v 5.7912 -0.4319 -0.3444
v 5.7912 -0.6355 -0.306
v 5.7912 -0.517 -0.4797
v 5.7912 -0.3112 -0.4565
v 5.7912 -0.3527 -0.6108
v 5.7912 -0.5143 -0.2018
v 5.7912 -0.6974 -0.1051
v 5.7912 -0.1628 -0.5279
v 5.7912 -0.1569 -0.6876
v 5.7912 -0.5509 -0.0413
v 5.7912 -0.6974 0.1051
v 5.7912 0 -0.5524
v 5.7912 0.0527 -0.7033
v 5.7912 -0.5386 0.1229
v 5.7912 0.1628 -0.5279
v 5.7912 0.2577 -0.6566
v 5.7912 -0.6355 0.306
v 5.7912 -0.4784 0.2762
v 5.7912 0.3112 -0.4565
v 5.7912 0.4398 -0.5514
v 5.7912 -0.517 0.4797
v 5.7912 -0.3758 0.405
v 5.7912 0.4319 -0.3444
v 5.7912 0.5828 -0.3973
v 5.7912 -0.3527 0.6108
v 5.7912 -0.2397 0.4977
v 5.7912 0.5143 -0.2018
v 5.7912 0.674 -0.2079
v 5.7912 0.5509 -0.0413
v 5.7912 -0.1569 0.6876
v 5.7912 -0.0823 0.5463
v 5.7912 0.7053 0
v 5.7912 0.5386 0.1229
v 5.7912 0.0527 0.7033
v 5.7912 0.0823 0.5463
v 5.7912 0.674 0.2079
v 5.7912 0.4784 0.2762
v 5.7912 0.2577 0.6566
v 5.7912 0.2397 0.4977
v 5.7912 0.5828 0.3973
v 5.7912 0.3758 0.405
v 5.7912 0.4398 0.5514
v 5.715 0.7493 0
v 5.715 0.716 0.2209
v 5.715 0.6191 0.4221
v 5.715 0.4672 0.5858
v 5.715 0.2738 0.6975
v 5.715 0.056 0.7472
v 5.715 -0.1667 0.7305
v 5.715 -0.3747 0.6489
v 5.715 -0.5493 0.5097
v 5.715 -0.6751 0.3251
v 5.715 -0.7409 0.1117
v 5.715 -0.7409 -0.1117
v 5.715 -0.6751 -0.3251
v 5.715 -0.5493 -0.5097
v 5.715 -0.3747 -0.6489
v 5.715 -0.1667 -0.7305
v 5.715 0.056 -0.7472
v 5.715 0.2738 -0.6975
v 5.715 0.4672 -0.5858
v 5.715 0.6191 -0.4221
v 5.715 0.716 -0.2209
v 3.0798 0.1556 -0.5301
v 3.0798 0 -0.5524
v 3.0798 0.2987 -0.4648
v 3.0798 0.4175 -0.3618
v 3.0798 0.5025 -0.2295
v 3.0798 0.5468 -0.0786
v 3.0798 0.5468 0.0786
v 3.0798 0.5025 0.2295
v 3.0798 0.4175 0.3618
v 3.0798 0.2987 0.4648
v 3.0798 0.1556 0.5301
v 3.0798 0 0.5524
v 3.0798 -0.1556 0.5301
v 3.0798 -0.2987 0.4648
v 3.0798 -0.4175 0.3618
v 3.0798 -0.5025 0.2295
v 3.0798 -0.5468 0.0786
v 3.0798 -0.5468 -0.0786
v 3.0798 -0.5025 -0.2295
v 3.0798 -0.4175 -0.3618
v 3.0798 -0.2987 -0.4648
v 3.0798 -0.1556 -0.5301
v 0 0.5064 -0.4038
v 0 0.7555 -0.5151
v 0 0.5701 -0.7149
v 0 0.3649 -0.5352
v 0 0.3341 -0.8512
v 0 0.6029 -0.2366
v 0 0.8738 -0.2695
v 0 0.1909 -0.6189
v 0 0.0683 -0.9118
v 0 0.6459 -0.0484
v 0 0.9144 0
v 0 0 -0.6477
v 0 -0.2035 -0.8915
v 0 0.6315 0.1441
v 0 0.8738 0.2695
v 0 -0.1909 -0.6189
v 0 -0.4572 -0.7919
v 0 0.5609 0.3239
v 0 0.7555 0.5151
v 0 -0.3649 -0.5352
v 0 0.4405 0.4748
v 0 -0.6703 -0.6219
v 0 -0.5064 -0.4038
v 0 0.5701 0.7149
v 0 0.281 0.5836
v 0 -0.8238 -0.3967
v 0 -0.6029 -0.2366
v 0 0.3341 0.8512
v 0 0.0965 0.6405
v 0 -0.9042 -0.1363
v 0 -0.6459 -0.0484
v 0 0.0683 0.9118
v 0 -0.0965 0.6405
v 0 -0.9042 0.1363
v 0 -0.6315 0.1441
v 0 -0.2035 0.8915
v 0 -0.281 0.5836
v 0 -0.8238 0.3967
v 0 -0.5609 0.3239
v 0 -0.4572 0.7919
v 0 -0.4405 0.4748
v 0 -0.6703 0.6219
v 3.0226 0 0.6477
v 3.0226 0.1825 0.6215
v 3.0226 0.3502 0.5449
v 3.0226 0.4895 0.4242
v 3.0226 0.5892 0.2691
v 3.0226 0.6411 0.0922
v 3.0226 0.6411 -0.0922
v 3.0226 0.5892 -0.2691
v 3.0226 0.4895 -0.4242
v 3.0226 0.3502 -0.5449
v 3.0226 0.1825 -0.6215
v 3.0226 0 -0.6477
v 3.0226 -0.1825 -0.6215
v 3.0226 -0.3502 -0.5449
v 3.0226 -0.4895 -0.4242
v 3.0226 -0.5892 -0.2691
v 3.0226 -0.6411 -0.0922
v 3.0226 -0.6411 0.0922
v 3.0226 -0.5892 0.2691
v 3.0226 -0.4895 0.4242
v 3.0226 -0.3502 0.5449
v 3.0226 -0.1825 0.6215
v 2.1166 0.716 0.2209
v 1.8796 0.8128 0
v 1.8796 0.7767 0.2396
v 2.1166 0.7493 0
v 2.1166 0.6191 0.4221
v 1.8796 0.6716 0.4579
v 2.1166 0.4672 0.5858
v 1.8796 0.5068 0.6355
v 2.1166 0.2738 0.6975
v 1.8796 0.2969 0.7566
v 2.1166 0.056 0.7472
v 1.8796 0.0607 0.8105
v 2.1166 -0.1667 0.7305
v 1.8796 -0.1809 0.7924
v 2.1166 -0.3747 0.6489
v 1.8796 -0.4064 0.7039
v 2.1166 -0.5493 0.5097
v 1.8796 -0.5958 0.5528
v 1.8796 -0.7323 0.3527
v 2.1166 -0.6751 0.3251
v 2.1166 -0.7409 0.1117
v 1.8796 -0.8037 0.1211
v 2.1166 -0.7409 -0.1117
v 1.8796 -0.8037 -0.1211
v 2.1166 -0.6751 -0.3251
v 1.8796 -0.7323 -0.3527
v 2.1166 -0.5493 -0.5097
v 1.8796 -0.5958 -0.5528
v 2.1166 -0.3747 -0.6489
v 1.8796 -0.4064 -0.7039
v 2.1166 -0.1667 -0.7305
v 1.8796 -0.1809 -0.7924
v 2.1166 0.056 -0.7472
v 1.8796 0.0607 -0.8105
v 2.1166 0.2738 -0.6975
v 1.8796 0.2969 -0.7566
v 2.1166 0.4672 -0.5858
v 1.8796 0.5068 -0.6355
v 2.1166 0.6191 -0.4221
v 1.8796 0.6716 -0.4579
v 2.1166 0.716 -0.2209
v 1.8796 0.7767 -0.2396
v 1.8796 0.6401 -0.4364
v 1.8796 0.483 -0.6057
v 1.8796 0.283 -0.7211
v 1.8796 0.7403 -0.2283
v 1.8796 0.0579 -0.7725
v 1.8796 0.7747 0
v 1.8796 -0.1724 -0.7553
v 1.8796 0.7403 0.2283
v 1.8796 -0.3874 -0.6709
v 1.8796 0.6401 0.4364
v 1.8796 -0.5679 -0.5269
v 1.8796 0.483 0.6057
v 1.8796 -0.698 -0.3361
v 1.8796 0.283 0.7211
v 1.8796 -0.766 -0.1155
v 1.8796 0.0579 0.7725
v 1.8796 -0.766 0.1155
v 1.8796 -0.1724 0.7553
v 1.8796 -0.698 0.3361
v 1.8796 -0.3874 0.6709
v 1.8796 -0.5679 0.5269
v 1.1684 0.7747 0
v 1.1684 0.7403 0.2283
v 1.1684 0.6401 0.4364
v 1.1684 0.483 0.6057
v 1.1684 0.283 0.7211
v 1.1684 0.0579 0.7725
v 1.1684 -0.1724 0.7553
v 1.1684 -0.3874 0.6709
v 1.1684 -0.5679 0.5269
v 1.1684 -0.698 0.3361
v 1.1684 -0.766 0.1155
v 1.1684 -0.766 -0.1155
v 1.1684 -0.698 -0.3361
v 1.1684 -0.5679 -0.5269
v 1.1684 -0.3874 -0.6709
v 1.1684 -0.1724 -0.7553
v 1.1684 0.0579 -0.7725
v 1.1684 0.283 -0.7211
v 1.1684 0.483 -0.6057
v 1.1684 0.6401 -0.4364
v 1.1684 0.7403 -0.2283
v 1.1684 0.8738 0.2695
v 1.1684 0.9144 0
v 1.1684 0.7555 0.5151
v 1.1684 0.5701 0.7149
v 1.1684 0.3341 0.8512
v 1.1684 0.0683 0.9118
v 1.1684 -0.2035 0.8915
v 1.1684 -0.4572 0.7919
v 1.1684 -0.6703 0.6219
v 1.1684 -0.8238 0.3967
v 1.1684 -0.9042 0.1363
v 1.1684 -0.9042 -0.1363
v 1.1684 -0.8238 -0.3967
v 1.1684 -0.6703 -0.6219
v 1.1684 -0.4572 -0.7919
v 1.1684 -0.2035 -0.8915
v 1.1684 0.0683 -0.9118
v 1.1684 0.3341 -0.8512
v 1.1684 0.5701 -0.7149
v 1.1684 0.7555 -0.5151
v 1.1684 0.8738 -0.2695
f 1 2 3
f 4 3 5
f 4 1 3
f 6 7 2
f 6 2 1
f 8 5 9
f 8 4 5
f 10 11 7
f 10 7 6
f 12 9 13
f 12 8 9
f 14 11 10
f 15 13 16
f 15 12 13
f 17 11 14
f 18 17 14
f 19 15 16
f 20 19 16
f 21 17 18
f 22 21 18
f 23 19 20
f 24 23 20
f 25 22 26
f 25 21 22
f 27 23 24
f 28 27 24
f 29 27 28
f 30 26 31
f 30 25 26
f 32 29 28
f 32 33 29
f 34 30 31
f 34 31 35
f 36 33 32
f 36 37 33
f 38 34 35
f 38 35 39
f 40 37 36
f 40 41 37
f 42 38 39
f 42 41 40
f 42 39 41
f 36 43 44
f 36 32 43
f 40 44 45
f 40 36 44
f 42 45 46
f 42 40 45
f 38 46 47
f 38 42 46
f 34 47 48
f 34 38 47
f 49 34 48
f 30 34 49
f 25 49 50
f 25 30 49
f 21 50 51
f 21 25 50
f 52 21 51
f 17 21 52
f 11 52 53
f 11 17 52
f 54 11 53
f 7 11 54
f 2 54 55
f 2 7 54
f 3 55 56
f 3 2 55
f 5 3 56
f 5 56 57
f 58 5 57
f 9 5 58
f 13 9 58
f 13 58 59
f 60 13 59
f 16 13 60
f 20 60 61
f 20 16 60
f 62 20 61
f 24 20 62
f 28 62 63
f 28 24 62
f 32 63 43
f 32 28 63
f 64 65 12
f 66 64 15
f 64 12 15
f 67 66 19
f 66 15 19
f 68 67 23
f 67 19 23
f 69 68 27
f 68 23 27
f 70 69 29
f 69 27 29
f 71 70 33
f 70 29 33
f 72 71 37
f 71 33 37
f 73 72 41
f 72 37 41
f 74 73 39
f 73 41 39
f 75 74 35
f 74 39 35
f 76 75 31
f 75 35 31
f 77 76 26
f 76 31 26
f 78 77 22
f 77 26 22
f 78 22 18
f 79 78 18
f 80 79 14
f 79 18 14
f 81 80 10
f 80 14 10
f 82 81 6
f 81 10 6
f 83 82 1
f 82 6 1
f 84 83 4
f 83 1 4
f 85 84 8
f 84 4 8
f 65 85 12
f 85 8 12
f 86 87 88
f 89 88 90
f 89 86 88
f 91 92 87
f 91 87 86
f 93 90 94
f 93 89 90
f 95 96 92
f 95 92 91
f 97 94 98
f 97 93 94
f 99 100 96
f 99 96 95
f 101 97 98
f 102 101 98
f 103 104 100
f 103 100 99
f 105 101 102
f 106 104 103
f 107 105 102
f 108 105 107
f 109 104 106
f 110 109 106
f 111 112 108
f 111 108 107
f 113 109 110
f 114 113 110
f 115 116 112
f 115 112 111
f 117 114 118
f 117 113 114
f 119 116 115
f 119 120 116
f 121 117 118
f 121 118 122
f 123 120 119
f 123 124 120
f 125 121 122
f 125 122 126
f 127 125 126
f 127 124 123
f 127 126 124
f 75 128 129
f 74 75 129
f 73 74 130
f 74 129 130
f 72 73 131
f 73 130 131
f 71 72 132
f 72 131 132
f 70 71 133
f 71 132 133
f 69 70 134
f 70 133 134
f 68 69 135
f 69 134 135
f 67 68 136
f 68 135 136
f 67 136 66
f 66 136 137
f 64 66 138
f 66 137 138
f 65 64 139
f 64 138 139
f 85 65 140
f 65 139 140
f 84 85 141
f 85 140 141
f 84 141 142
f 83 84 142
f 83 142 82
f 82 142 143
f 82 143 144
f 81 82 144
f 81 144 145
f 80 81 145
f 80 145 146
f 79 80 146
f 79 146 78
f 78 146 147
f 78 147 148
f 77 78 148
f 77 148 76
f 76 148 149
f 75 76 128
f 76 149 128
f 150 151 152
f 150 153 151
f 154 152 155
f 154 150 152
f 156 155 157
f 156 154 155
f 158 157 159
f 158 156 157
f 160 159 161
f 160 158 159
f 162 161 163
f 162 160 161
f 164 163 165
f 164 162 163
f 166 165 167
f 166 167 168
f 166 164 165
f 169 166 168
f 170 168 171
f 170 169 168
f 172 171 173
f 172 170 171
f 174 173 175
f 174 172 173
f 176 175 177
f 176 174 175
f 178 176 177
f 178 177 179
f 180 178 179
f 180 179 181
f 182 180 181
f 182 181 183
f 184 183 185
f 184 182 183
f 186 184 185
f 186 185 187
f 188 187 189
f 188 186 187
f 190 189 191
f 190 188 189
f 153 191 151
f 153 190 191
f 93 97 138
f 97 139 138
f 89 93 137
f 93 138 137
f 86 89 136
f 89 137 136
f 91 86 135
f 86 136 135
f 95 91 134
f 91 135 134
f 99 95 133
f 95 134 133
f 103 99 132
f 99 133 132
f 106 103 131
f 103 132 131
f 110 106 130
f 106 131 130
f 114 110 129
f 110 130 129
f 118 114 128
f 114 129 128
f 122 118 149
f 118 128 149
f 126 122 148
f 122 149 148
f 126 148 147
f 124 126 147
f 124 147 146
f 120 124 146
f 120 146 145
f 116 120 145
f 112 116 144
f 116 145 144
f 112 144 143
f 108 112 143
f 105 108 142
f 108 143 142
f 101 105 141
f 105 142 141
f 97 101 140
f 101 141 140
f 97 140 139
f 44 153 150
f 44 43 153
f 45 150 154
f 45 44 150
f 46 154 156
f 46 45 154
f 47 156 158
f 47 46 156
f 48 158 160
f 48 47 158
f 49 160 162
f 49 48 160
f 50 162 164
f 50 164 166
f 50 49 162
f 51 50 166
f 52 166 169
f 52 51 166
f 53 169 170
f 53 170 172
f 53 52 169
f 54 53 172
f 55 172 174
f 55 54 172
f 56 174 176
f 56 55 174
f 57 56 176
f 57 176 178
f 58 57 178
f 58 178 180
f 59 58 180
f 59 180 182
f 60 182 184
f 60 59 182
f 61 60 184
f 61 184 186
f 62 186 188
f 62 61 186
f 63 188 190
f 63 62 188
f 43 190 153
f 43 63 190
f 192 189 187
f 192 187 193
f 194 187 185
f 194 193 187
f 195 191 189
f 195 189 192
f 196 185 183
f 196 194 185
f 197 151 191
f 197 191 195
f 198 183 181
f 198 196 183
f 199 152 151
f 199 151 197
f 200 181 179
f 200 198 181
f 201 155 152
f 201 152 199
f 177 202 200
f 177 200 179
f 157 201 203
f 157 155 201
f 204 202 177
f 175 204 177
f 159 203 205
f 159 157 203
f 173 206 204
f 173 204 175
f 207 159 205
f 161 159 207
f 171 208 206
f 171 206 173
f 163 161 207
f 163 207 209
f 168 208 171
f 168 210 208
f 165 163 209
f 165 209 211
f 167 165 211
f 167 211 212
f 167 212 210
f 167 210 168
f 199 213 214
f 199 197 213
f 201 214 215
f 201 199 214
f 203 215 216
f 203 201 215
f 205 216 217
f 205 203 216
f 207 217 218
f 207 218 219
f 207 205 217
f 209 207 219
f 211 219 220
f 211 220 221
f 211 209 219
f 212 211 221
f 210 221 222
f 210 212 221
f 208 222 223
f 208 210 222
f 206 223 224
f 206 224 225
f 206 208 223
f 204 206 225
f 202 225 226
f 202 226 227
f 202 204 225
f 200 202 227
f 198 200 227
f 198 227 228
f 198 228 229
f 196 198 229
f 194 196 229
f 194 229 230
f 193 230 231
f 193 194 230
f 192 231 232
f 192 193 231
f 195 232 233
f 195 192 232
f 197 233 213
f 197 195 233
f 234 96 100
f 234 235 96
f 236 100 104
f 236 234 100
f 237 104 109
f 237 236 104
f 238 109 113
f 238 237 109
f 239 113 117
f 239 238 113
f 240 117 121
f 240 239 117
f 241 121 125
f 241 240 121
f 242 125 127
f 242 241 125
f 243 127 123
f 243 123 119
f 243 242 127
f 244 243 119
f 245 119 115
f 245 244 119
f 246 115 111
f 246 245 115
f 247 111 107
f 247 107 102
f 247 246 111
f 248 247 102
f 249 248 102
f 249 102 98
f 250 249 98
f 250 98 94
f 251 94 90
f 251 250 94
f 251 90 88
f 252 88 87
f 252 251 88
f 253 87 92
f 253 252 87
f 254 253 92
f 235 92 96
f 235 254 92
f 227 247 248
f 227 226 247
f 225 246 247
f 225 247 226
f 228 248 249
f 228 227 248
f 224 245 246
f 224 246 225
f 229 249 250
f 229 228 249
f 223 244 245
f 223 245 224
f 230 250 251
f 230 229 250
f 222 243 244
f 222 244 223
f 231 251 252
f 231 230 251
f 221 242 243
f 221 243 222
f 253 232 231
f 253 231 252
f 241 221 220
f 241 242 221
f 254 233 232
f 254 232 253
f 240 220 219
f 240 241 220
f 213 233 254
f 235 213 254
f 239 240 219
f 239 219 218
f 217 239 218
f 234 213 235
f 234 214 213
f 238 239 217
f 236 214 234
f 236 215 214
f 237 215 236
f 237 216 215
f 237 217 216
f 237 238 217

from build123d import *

# Parameters (mm, degrees)
HOLE1_D     = 1.2954
HOLE1_DEPTH = 3.0226
HOLE1_TIP   = 0.389177423
HOLE2_D     = 1.1049
HOLE2_DEPTH = 5.7912
HOLE2_TIP   = 0.331945449


with BuildPart() as part:
    # Sketch1 → RevolutionAngle1 (revolve)
    with BuildSketch(Plane.XY):
        Polygon((0, 0), (0, 0.9144), (1.1684, 0.9144), (1.1684, 0.7747), (1.8796, 0.7747), (1.8796, 0.8128), (2.116585226, 0.7493), (5.715, 0.7493), (5.7912, 0.705305909), (5.7912, 0), align=None)
    revolve(axis=Axis((0, 0, 0), (1, 0, 0)))

    # Hole1
    with Locations(Plane.ZY):
        with Locations((0, 0)):
            Hole(HOLE1_D / 2, depth=HOLE1_DEPTH)
            with Locations((0, 0, -(HOLE1_DEPTH + HOLE1_TIP / 2))):  # 118° drill point
                Cone(0, HOLE1_D / 2, HOLE1_TIP, mode=Mode.SUBTRACT)

    # Hole2
    with Locations(Plane(origin=(0, 0.189503468, -0.794290882), x_dir=(0, 0, 1), z_dir=(-1, 0, 0))):
        with Locations((0.794290882, -0.189503468)):
            Hole(HOLE2_D / 2, depth=HOLE2_DEPTH)
            with Locations((0, 0, -(HOLE2_DEPTH + HOLE2_TIP / 2))):  # 118° drill point
                Cone(0, HOLE2_D / 2, HOLE2_TIP, mode=Mode.SUBTRACT)


solid = part.part
